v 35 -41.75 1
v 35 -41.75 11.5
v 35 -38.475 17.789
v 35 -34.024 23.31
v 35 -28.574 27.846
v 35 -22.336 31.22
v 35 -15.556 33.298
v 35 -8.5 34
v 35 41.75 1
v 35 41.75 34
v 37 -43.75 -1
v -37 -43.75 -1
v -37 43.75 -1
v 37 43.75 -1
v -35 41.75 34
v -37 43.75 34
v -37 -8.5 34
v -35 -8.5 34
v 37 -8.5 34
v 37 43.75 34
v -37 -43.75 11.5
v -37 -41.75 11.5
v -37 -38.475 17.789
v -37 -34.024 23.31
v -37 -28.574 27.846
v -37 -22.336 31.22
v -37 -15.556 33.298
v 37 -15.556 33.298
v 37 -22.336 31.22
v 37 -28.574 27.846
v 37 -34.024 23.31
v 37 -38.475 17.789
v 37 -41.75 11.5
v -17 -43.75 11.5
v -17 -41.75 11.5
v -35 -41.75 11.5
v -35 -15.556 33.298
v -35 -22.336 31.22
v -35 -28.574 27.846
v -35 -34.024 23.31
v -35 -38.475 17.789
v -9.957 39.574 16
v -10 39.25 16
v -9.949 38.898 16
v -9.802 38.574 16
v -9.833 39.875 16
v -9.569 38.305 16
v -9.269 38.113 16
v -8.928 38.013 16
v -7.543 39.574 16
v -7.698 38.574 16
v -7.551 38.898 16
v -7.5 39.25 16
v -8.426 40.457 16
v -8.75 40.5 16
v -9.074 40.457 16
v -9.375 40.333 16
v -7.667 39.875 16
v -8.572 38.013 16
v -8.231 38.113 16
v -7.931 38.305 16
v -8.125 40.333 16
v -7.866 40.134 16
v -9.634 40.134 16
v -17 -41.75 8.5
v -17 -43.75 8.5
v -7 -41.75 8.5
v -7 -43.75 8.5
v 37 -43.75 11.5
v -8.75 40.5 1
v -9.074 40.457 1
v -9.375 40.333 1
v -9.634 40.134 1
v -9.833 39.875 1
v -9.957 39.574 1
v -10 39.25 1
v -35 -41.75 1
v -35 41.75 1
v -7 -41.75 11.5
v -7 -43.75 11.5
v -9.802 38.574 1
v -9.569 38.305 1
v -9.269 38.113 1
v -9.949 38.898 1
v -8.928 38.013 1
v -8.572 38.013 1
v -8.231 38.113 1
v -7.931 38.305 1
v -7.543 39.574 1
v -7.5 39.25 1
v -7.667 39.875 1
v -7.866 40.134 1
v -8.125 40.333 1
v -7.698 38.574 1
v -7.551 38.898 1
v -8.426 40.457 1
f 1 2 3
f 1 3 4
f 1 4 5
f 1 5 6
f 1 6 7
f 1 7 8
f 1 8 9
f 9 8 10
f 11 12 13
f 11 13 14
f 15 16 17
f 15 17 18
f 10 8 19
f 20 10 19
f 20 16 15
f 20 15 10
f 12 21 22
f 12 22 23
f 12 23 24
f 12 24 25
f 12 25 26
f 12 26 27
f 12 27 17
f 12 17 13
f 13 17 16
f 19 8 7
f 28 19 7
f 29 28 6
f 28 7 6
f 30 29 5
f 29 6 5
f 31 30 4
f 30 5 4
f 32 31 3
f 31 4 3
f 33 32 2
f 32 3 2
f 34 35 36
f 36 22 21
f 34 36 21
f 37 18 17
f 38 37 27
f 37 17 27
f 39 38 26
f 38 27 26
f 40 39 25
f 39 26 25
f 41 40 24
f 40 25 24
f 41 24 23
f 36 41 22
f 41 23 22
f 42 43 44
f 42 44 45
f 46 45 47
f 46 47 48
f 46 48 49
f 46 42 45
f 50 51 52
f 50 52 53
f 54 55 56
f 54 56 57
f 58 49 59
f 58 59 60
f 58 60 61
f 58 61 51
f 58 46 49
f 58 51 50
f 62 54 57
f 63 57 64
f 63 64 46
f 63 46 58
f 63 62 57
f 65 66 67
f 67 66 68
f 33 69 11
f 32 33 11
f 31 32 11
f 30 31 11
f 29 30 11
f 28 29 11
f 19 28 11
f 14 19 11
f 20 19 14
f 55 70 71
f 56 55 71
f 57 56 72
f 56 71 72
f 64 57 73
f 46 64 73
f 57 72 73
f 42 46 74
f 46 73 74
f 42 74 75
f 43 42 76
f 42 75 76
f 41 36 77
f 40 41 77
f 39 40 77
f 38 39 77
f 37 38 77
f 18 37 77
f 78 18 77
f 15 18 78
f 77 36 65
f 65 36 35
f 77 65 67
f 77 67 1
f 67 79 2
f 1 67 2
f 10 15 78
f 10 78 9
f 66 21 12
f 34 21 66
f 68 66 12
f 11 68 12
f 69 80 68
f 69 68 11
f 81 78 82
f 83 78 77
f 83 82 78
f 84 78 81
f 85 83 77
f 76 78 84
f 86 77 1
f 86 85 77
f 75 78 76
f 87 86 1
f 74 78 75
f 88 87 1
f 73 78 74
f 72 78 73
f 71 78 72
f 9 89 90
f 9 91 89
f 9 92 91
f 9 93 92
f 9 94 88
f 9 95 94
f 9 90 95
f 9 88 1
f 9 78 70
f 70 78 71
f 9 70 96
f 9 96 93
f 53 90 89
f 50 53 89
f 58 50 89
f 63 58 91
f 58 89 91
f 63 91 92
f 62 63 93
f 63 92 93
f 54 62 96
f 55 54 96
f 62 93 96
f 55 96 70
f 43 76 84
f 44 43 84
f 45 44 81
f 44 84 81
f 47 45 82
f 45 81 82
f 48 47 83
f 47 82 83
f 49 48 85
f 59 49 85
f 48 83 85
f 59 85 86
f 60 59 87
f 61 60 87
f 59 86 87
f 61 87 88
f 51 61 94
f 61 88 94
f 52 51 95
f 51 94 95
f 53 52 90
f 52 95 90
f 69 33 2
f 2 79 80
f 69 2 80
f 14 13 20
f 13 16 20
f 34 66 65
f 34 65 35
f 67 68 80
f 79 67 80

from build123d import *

# Parameters (mm, degrees)
F0_W      = 74
F0_H      = 87.5
F1_DEPTH  = 34
F2_W      = 70
F2_H      = 83.5
F4_DEPTH  = 33
F3_W      = 2
F3_H      = 22.5
F5_DEPTH  = 74
F8_DEPTH  = 15
F9_DEPTH  = 1
F6_W      = 10
F6_H      = 3
F10_DEPTH = 4


with BuildPart() as f1:
    # F0 (on Top) → F1 (new body)
    with BuildSketch(Plane.XY):
        Rectangle(F0_W, F0_H)
    extrude(amount=F1_DEPTH)

    # F2 (on face) → F4 (cut)
    with BuildSketch(Plane.XY.offset(34)):
        Rectangle(F2_W, F2_H)
    extrude(amount=-F4_DEPTH, mode=Mode.SUBTRACT)

    # F3 (on face) → F5 (cut)
    with BuildSketch(Plane(origin=(-37, 0, 0), x_dir=(0, -1, 0), z_dir=(-1, 0, 0))):
        with BuildLine():
            Line((41.75, 34), (8.5, 34))
            ThreePointArc((8.5, 34), (28.573692, 27.846401), (41.75, 11.5))
            Line((41.75, 11.5), (41.75, 34))
        make_face()
        with Locations((42.75, 22.75)):
            Rectangle(F3_W, F3_H)
    extrude(amount=-F5_DEPTH, mode=Mode.SUBTRACT)

    # F7 (on face) → F8 (join)
    with BuildSketch(Plane.XY.offset(1)):
        with BuildLine():
            ThreePointArc((-7.5, 39.25), (-7.866117, 40.133883), (-8.75, 40.5))
            Line((-8.75, 40.5), (-8.75, 39.25))
            Line((-8.75, 39.25), (-10, 39.25))
            ThreePointArc((-10, 39.25), (-8.75, 38), (-7.5, 39.25))
        make_face()
        with BuildLine():
            Line((-8.75, 39.25), (-8.75, 40.5))
            ThreePointArc((-8.75, 40.5), (-9.633883, 40.133883), (-10, 39.25))
            Line((-10, 39.25), (-8.75, 39.25))
        make_face()
    extrude(amount=F8_DEPTH)

    # F0 (on Top) → F9 (join)
    with BuildSketch(Plane.XY):
        Rectangle(F0_W, F0_H)
    extrude(amount=-F9_DEPTH)

    # F6 (on face) → F10 (cut)
    with BuildSketch(Plane.XZ.offset(43.75)):
        with Locations((-12, 10)):
            Rectangle(F6_W, F6_H)
    extrude(amount=-F10_DEPTH, mode=Mode.SUBTRACT)


solid = f1.part
